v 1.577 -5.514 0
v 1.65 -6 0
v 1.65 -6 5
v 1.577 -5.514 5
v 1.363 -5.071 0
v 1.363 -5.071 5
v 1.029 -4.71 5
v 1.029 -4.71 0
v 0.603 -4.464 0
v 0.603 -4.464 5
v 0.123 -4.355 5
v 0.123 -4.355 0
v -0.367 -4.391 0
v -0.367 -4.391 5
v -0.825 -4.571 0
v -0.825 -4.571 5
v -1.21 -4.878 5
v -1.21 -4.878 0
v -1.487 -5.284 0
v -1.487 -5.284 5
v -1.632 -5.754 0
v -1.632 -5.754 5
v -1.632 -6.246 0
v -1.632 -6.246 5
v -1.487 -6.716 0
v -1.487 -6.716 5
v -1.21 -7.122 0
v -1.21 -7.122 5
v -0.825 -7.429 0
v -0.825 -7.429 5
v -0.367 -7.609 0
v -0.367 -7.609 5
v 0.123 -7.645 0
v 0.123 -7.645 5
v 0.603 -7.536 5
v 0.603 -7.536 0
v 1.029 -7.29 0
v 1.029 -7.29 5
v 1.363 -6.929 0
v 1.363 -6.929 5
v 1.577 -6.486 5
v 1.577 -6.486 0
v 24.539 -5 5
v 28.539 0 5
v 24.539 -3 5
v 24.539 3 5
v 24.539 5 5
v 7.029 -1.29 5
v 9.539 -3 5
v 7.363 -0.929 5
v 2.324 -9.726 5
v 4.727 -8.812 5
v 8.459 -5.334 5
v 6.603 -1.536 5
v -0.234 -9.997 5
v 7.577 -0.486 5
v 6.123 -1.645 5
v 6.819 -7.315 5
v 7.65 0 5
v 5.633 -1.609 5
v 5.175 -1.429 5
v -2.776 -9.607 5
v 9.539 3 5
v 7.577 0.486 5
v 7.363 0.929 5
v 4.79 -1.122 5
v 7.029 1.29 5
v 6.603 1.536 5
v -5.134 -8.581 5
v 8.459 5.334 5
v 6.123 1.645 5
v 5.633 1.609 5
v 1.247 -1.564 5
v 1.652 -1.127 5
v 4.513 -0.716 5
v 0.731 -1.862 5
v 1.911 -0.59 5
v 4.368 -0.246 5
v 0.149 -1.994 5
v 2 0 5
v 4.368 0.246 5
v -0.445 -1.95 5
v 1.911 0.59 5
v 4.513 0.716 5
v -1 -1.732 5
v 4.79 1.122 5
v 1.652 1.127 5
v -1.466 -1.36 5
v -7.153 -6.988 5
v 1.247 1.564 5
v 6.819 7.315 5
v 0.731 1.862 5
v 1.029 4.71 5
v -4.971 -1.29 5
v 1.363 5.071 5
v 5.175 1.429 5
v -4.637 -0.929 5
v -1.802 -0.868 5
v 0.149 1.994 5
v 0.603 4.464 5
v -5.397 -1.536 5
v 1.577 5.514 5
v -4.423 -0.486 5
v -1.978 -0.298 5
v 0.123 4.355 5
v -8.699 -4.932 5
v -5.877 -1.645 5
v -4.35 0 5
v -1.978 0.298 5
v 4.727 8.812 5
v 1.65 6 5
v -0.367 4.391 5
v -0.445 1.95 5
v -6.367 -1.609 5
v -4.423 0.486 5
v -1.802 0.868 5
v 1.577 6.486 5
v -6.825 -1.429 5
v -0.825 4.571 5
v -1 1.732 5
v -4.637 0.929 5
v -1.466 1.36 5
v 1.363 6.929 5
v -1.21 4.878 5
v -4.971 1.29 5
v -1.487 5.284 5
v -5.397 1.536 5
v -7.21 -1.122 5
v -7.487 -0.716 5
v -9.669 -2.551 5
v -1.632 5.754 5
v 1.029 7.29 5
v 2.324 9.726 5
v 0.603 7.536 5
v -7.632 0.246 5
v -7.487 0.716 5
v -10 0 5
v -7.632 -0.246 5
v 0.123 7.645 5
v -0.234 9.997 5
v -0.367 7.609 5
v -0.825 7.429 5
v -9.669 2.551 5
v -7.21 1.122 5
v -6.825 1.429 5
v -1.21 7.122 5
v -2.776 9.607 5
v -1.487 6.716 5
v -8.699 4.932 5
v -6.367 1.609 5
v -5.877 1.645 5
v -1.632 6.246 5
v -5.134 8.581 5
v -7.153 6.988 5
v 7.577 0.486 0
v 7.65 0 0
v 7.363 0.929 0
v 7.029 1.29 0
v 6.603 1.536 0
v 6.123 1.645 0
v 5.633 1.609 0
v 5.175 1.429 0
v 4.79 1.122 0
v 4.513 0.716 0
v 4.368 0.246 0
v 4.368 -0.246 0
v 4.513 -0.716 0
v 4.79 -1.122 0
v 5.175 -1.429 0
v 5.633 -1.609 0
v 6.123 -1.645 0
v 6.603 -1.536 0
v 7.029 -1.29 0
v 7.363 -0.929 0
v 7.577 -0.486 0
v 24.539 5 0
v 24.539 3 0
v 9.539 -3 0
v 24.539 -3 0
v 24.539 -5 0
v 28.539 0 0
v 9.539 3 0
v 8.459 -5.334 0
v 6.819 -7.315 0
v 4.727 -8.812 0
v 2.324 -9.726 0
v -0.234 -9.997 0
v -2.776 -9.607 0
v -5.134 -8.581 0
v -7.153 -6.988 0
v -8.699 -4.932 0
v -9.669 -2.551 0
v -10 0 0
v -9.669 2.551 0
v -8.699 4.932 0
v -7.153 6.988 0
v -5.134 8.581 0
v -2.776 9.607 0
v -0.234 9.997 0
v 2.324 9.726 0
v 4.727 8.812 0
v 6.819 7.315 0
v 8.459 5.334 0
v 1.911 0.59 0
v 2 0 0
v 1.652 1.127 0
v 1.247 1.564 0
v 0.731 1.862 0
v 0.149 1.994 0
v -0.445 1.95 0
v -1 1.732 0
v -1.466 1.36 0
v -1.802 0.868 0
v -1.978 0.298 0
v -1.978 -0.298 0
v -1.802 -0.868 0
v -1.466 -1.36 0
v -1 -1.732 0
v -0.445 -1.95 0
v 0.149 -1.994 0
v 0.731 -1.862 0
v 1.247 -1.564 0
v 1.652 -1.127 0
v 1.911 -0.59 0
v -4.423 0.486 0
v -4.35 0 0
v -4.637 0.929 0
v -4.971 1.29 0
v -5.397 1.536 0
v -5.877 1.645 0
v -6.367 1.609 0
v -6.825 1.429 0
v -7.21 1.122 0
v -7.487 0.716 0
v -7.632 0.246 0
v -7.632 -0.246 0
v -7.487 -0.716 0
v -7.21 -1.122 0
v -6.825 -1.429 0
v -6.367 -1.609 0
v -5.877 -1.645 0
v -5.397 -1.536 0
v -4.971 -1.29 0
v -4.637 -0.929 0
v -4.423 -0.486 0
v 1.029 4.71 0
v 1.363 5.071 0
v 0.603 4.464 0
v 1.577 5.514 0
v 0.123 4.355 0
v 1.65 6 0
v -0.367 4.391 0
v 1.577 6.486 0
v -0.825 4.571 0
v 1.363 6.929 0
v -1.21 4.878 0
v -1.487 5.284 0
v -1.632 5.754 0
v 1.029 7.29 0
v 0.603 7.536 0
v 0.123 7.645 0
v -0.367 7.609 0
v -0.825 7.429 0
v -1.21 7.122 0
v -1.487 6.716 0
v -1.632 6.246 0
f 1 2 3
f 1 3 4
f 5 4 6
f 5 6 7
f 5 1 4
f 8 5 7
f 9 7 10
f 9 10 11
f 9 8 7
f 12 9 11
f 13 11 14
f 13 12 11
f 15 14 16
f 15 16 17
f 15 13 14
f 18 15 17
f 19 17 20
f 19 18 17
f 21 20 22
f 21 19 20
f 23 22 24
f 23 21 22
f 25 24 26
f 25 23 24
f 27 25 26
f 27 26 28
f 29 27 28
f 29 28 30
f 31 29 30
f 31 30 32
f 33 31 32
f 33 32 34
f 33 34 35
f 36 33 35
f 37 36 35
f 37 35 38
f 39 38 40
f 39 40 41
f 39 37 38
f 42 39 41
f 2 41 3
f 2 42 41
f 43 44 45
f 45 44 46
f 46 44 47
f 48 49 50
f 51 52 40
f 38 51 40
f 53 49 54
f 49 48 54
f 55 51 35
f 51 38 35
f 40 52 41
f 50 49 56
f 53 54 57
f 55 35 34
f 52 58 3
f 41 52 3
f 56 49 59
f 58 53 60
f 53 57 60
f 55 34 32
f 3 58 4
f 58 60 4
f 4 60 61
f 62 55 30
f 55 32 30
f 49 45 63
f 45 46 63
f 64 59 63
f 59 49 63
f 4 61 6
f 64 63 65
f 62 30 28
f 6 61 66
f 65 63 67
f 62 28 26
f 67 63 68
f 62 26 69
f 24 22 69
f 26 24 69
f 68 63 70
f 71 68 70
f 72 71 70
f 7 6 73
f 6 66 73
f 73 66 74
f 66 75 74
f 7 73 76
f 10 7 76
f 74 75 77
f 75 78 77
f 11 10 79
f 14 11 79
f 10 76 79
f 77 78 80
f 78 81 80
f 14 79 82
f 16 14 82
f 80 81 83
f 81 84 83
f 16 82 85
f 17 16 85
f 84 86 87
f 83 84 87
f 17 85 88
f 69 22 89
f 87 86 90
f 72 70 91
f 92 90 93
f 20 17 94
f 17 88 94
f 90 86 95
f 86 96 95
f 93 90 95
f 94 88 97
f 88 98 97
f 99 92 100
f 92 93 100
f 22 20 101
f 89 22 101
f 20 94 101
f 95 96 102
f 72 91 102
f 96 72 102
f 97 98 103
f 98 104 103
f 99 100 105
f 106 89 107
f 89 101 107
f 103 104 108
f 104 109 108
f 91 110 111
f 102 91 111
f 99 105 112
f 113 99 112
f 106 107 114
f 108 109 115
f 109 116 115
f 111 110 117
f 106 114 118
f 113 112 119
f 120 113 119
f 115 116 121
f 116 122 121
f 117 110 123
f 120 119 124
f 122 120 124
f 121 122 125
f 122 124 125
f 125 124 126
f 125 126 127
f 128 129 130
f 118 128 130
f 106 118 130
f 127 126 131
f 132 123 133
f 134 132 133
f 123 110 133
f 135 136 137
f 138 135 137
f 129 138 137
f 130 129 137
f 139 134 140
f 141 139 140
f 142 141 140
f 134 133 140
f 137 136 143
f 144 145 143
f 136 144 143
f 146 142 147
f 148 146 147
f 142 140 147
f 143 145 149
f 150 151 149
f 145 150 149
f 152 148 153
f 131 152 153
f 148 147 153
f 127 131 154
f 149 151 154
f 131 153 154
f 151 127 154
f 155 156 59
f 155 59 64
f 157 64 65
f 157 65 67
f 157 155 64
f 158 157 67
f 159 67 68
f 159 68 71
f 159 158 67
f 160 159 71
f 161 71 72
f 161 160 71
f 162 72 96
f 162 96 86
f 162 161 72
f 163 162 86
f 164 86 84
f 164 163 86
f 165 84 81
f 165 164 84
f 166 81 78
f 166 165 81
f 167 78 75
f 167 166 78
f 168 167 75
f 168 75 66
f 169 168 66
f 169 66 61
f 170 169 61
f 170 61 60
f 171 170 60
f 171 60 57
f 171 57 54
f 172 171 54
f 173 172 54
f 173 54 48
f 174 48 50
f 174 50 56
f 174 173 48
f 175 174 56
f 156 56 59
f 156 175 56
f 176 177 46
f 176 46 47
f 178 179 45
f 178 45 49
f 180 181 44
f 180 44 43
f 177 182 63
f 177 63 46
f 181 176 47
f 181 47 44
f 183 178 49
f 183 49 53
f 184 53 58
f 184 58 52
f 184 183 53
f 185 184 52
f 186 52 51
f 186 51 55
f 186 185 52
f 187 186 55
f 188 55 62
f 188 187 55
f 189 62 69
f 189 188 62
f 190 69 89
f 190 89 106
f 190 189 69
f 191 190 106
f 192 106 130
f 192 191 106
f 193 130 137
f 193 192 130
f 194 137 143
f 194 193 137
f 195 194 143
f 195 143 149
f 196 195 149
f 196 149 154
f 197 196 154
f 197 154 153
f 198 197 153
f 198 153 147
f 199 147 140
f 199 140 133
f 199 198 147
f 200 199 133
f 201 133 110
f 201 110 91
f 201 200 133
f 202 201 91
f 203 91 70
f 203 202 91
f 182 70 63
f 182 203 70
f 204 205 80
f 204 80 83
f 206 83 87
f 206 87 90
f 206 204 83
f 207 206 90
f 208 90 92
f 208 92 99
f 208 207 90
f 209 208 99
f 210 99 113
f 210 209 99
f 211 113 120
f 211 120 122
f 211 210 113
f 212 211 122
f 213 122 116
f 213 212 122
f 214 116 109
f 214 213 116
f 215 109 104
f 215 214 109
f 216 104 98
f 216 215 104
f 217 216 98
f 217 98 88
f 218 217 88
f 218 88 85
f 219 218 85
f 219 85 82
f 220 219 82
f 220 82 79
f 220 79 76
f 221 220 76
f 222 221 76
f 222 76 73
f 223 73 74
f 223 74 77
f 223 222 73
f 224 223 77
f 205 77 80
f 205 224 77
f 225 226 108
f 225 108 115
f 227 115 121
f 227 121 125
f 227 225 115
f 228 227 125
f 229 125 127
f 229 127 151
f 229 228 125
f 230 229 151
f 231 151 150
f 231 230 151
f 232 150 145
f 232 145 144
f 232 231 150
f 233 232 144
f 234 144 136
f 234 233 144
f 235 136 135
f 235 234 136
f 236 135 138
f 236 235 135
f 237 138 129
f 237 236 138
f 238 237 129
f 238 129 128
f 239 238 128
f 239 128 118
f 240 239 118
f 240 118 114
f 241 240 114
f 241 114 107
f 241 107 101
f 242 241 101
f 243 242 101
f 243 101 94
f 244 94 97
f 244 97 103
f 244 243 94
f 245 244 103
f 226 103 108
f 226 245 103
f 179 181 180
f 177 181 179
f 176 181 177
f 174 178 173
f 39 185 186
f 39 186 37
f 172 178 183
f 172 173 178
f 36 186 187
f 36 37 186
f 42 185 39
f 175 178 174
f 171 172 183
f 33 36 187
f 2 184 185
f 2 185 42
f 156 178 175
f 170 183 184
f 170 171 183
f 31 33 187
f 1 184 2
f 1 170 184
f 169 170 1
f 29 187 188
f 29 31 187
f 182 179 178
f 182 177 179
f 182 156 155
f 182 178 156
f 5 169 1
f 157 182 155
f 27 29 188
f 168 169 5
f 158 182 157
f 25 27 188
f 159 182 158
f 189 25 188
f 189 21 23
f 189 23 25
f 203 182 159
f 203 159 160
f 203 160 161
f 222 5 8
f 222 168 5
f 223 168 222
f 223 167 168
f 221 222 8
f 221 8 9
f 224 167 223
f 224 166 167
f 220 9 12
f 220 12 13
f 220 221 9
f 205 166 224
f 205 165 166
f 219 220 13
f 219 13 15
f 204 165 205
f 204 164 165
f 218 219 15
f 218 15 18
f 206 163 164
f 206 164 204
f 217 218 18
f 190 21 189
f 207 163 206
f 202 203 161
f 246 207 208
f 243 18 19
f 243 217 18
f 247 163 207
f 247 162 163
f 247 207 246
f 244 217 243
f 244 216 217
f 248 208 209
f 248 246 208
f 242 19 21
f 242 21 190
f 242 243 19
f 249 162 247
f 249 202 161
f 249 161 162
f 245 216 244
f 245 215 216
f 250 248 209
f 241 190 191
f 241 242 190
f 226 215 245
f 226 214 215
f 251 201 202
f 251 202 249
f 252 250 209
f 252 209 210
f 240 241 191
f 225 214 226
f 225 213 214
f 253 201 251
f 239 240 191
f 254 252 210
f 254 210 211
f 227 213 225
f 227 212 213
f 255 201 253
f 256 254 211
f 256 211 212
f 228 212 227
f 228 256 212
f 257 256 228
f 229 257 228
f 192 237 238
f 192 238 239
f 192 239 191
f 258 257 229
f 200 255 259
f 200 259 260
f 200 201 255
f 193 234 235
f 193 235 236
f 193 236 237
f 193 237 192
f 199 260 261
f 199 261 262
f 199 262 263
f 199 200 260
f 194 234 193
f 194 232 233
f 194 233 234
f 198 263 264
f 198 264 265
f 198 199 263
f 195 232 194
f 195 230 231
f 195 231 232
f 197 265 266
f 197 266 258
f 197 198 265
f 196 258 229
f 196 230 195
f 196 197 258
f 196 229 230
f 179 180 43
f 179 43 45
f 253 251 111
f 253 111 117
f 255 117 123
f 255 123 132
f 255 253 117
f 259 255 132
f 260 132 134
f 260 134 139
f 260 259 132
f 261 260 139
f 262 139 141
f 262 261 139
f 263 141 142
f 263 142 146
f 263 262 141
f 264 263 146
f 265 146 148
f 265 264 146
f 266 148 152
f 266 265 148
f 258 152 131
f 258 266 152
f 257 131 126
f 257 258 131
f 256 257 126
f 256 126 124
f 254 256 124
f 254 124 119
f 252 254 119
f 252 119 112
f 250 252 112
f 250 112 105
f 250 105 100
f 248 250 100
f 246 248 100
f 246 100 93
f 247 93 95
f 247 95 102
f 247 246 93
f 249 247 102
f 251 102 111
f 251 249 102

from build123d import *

# Parameters (mm, degrees)
SKETCH1_R           = 2
SKETCH1_R_2         = 1.65
BOSS_EXTRUDE1_DEPTH = 5


with BuildPart() as part:
    # Sketch1 → Boss-Extrude1 (new body)
    with BuildSketch(Plane.XY):
        with BuildLine():
            Line((9.539392014, 3), (24.539392014, 3))
            Line((24.539392014, 3), (24.539392014, 5))
            Line((24.539392014, 5), (28.539392014, 0))
            Line((28.539392014, 0), (24.539392014, -5))
            Line((24.539392014, -5), (24.539392014, -3))
            Line((24.539392014, -3), (9.539392014, -3))
            ThreePointArc((9.539392014, -3), (-10, 0), (9.539392014, 3))
        make_face()
        Circle(SKETCH1_R, mode=Mode.SUBTRACT)
        with Locations((0, 6)):
            Circle(SKETCH1_R_2, mode=Mode.SUBTRACT)
        with Locations((6, 0)):
            Circle(SKETCH1_R_2, mode=Mode.SUBTRACT)
        with Locations((0, -6)):
            Circle(SKETCH1_R_2, mode=Mode.SUBTRACT)
        with Locations((-6, 0)):
            Circle(SKETCH1_R_2, mode=Mode.SUBTRACT)
    extrude(amount=BOSS_EXTRUDE1_DEPTH)


solid = part.part
